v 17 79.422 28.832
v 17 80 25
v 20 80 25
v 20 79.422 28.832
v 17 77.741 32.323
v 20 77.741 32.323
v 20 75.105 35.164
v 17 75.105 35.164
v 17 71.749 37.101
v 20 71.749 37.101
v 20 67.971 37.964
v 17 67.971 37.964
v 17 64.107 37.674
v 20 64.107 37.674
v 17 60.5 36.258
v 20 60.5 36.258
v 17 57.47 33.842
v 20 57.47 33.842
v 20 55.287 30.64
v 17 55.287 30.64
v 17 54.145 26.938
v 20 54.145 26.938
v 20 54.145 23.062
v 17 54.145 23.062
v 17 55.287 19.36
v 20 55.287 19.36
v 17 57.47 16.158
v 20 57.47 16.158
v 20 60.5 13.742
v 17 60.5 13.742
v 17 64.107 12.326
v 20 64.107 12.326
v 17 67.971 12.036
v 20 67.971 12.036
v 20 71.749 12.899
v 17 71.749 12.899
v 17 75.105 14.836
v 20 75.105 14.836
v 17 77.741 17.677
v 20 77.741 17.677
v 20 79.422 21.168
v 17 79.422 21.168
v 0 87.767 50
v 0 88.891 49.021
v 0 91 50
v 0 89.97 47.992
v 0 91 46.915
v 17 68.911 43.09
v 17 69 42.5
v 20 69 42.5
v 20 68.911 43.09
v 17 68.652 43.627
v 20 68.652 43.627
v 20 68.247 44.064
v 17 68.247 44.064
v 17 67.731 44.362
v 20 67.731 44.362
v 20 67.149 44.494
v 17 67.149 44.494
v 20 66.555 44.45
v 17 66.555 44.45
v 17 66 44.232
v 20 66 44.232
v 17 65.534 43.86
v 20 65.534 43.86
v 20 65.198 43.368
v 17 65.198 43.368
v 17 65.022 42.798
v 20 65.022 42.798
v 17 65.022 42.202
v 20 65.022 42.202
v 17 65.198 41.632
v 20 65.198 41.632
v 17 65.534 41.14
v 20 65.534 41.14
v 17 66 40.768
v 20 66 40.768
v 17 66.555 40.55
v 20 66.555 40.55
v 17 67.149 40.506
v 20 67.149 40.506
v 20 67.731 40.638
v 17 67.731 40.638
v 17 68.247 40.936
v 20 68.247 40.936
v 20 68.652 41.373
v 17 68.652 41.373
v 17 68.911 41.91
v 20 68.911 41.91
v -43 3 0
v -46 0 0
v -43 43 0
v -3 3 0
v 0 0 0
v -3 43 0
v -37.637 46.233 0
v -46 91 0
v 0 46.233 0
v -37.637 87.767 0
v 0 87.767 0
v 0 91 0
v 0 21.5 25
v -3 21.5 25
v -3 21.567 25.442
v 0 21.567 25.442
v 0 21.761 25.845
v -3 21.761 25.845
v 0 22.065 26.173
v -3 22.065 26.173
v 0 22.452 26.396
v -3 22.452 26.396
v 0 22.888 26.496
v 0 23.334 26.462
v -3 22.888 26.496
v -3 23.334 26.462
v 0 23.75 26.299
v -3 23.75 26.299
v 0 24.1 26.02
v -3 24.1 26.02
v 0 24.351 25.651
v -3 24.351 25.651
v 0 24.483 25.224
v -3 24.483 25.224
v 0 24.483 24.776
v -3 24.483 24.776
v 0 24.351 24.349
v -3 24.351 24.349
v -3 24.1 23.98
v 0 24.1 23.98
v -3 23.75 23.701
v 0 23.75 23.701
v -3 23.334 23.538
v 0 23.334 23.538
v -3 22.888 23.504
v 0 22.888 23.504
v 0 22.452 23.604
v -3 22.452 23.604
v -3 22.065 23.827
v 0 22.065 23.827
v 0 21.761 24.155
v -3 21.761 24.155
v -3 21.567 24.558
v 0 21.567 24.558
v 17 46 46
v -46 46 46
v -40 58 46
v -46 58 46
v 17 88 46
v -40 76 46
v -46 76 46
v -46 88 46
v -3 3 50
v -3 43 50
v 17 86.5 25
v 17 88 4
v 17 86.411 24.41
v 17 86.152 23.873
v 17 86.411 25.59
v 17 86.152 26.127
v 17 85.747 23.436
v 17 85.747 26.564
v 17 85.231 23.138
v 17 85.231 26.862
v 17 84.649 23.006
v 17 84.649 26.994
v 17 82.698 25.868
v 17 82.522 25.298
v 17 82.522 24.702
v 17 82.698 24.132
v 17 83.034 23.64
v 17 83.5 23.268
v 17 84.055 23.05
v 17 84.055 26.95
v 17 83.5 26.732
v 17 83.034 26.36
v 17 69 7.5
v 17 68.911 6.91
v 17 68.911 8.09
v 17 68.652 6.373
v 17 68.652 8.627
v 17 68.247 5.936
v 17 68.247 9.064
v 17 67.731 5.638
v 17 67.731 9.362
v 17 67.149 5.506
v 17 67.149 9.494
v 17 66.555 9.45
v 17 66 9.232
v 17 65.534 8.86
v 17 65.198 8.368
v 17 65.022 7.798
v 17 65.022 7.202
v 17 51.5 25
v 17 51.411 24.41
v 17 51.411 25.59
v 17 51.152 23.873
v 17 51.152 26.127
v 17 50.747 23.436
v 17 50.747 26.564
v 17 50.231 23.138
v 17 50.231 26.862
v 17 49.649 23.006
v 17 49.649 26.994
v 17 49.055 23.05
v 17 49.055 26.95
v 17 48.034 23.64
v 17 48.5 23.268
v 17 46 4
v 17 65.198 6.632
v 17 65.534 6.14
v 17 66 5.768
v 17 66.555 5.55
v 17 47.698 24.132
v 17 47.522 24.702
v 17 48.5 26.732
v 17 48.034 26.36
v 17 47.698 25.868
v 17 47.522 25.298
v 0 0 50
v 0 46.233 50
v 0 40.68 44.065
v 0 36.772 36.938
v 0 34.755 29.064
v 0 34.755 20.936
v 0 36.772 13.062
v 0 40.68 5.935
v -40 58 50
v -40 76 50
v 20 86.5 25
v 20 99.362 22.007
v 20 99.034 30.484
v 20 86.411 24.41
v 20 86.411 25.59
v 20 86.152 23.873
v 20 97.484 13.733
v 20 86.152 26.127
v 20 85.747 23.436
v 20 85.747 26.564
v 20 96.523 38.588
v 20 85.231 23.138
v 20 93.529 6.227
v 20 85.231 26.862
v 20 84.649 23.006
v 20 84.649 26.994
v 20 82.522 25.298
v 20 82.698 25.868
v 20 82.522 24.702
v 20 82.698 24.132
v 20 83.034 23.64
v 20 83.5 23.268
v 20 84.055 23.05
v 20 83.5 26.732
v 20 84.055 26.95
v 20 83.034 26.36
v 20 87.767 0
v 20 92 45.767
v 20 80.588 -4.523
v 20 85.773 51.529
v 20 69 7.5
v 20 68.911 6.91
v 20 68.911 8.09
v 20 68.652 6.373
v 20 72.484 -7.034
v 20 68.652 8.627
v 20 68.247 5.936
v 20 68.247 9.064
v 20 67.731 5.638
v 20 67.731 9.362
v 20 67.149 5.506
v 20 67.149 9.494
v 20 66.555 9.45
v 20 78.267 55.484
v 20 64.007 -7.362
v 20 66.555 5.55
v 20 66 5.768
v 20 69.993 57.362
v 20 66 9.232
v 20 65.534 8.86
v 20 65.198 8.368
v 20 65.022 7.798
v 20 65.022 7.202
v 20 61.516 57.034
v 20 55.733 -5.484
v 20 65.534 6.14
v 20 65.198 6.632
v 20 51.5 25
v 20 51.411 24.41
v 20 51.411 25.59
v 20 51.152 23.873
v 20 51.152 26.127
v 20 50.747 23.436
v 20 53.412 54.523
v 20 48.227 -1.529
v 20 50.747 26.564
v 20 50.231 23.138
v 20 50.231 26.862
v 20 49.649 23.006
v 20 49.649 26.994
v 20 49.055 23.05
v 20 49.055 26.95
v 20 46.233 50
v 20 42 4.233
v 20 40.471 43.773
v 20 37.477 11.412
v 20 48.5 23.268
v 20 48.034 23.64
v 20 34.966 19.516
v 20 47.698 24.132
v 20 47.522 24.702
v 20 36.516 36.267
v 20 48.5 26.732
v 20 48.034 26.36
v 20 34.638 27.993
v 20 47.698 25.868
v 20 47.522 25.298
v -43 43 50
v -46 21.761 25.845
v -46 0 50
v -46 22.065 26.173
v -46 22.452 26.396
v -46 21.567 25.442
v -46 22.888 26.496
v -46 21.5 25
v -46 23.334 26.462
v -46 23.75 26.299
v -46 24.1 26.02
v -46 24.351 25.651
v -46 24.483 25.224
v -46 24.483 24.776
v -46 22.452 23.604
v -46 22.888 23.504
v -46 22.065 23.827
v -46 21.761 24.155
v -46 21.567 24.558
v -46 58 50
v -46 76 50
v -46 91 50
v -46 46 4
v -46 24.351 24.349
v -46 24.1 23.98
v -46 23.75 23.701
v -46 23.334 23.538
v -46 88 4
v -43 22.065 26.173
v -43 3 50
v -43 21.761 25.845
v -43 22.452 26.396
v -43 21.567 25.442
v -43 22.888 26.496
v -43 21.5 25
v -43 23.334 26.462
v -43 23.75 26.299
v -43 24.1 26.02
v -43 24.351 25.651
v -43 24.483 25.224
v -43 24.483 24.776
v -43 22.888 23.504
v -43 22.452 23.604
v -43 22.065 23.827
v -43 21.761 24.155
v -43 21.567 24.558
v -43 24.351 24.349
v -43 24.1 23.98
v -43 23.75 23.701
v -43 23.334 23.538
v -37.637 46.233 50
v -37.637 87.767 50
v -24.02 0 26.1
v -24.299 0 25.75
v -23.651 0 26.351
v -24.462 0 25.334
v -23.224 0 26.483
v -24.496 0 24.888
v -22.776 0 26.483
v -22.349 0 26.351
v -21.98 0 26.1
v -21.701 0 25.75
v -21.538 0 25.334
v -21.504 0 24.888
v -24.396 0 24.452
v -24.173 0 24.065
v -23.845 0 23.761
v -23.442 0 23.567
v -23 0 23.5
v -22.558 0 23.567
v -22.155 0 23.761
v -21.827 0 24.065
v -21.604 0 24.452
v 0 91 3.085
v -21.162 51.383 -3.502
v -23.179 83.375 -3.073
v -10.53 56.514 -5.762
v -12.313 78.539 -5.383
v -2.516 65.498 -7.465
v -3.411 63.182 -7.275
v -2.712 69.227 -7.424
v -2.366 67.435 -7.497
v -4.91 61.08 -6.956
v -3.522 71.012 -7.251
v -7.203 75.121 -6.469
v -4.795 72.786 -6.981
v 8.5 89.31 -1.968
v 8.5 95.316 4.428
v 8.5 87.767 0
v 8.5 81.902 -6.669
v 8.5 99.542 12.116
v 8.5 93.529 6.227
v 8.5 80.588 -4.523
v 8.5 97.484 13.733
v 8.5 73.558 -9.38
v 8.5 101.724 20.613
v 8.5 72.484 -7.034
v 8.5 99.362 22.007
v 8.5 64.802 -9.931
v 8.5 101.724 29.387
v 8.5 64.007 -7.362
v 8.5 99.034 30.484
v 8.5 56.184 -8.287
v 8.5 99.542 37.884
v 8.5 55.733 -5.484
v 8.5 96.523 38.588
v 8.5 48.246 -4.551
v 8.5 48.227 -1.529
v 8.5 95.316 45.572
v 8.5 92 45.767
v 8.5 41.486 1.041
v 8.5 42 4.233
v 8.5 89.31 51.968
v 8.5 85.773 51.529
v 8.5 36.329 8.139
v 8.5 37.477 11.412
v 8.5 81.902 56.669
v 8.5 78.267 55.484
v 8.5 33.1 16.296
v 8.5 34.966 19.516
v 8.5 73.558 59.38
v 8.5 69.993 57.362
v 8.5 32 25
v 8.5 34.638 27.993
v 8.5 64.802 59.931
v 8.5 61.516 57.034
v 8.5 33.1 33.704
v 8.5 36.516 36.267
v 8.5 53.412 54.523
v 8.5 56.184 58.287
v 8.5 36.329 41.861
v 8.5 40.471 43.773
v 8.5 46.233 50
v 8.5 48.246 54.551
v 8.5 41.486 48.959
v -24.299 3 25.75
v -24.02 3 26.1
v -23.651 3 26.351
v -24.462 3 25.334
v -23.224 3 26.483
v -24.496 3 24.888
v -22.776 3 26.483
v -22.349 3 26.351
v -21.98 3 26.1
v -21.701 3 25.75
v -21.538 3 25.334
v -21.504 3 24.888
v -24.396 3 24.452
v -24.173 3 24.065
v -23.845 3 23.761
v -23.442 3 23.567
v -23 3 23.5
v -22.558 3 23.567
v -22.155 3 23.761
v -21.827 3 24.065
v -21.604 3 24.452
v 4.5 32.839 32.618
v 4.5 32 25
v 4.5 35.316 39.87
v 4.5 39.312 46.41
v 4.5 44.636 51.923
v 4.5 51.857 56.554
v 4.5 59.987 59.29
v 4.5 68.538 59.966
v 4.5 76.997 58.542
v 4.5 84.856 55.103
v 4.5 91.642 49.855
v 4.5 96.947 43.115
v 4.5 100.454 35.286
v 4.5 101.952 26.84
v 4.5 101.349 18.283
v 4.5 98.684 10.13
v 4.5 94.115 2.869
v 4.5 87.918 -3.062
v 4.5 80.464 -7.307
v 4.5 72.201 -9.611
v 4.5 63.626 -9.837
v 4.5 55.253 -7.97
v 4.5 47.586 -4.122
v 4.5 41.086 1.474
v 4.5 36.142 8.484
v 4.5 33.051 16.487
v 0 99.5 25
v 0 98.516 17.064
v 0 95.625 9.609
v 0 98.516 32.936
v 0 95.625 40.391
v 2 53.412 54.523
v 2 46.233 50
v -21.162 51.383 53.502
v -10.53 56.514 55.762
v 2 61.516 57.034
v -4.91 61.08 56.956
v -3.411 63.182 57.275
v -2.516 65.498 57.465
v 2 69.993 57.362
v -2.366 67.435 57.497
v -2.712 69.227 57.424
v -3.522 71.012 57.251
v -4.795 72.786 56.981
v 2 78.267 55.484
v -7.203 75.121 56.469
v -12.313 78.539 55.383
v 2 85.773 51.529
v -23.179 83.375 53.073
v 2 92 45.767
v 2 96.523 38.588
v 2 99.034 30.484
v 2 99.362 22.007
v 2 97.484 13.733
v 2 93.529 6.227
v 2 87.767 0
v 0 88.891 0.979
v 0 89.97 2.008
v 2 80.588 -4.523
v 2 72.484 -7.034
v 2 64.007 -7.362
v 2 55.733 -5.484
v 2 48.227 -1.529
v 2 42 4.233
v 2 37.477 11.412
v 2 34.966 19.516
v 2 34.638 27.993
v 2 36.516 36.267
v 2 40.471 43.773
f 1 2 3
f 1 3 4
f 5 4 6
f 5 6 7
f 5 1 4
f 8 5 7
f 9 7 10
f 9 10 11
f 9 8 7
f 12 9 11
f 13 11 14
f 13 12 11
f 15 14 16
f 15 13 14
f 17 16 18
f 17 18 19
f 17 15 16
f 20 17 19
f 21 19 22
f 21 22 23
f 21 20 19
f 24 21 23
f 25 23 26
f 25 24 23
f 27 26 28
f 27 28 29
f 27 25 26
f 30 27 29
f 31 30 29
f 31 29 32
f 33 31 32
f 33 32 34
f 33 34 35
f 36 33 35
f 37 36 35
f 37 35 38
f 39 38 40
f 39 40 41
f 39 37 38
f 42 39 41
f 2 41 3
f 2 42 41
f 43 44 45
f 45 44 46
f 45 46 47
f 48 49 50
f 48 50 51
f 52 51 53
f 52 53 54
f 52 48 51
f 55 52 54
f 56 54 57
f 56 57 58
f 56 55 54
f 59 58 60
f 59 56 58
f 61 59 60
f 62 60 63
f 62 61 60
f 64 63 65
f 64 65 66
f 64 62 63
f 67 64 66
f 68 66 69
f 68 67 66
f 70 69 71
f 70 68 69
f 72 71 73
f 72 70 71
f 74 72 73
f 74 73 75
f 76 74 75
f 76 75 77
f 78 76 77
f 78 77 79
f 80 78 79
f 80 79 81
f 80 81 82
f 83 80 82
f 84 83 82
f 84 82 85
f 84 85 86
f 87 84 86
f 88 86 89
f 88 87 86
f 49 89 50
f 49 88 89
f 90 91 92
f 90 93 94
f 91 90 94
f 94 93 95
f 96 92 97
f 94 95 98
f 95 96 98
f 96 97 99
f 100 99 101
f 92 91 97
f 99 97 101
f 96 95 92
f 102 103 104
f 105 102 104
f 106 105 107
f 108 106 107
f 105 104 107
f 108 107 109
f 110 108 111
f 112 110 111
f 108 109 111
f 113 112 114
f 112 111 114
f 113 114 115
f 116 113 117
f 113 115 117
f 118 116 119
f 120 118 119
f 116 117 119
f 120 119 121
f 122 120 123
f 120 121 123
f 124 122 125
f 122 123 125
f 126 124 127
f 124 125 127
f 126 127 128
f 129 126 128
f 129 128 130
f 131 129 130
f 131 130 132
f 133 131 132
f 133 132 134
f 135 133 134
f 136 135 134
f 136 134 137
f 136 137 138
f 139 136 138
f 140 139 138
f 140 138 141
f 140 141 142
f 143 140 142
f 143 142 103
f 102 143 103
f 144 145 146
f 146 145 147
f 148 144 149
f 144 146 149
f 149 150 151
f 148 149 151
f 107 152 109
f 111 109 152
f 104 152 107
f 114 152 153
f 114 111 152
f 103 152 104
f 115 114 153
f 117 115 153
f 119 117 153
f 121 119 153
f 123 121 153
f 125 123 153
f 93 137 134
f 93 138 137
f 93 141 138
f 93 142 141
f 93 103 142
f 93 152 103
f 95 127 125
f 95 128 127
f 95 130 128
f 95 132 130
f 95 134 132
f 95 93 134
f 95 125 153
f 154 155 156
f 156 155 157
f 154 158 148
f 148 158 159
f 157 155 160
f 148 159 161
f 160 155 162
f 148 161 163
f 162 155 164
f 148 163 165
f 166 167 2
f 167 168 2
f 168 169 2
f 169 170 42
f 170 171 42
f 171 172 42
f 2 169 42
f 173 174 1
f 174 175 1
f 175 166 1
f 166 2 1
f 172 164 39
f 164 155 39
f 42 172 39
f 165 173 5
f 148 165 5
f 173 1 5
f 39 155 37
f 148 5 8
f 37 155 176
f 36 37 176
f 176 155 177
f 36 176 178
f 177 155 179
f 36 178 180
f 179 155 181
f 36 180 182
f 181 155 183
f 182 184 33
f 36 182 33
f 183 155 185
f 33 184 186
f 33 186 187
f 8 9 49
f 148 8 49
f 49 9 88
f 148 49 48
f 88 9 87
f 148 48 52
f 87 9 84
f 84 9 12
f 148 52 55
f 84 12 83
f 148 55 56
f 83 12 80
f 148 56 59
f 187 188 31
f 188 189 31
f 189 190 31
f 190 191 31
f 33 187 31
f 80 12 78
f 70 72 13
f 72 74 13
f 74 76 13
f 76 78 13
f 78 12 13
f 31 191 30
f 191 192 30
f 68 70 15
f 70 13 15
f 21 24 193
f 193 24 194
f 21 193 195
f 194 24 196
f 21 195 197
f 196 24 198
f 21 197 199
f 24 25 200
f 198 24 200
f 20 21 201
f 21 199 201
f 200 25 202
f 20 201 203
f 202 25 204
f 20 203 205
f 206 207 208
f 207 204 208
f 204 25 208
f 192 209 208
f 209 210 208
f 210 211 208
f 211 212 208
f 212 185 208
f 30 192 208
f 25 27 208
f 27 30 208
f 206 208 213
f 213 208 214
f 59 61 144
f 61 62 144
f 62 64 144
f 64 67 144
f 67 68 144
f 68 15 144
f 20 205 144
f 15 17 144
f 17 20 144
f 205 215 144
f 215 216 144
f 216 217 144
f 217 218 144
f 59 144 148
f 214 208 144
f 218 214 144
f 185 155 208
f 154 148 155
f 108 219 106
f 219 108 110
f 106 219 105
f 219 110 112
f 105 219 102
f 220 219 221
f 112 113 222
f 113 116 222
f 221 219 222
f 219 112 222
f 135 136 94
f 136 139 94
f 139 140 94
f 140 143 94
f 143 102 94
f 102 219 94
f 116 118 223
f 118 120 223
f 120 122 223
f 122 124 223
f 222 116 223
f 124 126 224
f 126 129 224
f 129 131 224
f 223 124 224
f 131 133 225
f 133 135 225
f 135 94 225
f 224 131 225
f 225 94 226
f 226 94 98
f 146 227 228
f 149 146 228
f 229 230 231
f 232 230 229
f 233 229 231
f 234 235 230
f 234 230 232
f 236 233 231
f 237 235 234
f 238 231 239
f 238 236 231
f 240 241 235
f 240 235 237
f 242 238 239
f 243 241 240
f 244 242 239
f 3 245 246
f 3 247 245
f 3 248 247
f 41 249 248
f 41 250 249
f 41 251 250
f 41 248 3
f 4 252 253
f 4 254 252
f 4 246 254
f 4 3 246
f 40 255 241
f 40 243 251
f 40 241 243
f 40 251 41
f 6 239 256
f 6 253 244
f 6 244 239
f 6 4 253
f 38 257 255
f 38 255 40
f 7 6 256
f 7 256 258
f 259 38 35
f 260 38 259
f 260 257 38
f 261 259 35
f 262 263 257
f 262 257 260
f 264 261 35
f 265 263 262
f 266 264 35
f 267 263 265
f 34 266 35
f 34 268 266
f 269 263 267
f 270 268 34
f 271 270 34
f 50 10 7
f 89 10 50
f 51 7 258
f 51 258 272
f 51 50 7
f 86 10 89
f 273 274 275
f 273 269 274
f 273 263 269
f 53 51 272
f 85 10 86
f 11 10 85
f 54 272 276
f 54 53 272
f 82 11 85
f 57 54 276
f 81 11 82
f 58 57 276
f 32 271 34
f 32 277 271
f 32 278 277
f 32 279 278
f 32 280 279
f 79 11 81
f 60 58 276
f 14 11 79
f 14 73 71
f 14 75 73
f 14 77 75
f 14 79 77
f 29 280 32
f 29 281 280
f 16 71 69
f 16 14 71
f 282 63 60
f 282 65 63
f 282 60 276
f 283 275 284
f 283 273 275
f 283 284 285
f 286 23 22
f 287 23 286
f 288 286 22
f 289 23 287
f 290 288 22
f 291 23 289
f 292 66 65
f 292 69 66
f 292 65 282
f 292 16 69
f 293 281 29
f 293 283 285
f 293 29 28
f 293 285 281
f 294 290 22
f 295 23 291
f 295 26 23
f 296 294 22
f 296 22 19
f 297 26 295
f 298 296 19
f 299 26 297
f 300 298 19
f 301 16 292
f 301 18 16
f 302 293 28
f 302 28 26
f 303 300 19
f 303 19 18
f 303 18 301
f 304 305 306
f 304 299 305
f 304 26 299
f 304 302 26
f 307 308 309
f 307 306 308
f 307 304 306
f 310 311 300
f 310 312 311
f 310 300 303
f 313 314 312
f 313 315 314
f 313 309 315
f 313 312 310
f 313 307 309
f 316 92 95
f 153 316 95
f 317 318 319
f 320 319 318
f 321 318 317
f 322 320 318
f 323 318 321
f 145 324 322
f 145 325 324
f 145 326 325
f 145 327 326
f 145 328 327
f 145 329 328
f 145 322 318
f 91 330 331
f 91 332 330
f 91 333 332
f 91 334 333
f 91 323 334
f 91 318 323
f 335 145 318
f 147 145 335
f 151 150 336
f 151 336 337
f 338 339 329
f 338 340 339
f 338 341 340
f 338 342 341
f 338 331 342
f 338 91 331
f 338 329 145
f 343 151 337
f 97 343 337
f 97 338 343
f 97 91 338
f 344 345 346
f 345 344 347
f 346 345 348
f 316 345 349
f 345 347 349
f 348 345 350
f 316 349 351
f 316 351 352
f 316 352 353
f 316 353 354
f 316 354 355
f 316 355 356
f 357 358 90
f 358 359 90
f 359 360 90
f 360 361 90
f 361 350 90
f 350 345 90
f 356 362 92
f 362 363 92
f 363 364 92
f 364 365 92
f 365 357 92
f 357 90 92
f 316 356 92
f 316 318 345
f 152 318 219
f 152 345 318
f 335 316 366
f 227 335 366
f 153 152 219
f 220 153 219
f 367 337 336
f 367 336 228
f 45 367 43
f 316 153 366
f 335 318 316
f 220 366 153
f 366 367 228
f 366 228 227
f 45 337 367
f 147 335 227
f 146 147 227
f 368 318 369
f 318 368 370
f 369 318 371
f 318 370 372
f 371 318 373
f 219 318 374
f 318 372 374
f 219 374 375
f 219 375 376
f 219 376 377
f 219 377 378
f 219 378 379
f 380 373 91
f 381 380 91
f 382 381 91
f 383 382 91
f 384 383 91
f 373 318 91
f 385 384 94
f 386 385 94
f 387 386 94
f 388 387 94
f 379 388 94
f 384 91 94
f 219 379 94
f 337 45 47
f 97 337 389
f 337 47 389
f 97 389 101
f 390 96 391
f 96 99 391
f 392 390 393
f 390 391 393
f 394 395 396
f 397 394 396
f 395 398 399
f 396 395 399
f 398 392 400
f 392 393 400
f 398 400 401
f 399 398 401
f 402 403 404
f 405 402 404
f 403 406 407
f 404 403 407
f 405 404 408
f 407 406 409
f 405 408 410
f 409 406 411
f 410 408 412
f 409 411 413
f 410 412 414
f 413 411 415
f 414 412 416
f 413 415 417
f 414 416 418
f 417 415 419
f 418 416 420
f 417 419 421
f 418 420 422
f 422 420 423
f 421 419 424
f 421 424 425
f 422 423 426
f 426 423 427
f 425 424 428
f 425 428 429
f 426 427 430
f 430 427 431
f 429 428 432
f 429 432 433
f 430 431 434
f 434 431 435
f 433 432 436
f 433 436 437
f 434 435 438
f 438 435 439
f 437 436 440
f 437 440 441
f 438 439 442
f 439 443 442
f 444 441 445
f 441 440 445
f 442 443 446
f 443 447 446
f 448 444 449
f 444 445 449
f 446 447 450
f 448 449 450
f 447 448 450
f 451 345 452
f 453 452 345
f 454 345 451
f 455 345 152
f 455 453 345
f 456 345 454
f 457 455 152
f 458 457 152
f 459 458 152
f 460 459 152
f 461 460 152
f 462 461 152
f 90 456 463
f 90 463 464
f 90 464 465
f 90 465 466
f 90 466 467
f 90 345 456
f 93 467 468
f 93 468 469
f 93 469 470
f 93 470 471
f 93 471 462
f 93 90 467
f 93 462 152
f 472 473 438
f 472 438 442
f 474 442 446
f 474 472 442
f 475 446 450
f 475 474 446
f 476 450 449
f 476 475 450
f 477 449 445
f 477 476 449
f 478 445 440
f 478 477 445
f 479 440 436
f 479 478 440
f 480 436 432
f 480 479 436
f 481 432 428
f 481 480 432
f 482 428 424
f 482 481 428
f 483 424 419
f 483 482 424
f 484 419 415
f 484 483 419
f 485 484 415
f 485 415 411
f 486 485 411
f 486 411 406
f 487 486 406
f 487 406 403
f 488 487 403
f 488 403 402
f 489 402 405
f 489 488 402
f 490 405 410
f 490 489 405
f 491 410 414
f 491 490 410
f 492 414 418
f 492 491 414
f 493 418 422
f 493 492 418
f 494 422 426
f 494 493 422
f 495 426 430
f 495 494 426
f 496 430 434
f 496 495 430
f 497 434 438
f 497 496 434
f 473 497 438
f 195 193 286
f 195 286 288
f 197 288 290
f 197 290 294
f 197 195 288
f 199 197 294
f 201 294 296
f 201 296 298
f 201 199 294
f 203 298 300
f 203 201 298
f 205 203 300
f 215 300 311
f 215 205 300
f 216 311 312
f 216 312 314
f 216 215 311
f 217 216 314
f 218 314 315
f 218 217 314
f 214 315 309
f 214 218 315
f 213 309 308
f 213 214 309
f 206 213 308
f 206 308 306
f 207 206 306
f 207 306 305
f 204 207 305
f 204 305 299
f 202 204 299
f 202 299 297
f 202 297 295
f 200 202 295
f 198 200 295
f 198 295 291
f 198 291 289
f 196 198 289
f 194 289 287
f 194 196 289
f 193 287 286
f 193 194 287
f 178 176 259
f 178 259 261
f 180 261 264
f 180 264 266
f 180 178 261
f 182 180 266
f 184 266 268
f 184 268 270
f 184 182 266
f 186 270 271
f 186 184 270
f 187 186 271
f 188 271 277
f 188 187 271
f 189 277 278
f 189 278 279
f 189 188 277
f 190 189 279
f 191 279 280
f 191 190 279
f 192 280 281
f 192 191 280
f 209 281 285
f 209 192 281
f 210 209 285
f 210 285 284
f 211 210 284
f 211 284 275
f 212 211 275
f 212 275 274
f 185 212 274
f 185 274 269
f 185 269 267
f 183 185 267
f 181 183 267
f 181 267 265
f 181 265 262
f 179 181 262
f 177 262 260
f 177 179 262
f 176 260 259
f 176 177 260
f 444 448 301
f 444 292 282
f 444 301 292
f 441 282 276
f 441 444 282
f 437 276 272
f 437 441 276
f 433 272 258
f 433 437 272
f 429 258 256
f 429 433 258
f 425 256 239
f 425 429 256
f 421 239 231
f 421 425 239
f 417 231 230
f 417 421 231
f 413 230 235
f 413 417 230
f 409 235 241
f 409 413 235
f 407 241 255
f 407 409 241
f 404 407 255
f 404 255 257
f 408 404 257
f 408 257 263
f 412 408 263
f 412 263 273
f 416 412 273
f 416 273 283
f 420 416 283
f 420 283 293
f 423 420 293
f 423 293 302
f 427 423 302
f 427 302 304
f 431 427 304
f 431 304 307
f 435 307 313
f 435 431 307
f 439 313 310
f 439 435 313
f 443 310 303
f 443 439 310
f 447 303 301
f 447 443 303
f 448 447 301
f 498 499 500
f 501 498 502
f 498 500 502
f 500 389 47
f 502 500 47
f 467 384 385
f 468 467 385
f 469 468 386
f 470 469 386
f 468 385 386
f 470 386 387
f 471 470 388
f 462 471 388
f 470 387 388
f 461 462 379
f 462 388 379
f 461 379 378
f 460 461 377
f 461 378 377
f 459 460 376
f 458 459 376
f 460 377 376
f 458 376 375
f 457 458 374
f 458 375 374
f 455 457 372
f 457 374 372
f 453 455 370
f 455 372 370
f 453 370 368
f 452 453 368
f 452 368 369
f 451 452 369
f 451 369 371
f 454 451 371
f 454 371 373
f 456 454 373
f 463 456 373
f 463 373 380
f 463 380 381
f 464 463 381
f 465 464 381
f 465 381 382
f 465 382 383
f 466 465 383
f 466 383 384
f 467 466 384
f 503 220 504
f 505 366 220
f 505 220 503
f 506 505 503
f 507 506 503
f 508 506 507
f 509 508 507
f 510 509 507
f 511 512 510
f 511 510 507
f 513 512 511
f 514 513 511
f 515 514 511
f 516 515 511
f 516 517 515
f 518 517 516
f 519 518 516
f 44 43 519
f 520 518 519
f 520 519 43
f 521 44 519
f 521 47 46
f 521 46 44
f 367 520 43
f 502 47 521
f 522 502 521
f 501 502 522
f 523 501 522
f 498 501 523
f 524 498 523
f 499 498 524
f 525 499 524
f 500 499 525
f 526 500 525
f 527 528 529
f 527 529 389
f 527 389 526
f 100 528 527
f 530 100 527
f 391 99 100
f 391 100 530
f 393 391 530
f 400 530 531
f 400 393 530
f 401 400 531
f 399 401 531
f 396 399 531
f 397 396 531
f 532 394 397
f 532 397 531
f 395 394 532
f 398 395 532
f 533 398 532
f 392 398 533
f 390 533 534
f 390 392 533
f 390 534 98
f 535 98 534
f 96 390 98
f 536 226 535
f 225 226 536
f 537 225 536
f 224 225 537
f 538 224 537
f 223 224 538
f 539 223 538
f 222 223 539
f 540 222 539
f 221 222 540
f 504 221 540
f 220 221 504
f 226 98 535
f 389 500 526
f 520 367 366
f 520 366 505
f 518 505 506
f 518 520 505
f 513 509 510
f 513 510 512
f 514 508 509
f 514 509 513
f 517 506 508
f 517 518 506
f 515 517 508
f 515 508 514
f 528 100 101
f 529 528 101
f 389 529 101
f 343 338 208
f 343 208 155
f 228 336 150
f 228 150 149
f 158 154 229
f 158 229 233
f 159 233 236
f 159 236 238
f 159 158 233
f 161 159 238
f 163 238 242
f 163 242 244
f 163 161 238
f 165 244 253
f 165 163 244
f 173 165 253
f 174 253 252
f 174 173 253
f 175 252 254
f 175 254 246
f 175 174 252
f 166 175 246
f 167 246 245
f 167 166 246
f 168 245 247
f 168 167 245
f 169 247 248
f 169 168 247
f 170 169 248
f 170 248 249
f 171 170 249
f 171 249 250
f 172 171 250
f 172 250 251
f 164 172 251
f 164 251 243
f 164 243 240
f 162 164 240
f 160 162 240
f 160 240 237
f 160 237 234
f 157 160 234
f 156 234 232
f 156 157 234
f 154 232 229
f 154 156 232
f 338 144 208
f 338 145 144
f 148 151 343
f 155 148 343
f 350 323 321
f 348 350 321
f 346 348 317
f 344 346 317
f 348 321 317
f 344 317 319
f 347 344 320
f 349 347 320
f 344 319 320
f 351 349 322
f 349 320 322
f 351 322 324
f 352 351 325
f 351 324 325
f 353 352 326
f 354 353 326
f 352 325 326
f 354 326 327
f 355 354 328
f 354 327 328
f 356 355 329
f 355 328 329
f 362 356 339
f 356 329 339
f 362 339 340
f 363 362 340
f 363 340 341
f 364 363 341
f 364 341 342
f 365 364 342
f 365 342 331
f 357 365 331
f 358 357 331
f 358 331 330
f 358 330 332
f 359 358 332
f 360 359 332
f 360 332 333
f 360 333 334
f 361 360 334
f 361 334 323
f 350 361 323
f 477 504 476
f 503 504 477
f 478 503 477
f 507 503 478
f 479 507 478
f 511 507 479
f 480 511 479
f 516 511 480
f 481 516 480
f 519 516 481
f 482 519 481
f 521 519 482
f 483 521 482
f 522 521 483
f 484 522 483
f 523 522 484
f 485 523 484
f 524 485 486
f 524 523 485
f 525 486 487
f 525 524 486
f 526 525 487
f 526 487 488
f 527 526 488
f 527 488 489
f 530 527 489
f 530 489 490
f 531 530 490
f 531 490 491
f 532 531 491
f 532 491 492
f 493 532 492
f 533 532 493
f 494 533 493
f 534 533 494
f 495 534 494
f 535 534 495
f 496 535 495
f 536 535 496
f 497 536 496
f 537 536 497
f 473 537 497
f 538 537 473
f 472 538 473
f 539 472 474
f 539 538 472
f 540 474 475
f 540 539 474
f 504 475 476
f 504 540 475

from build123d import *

# Parameters (mm, degrees)
ESQUISSE1_W             = 46
ESQUISSE1_H             = 46
ESQUISSE1_W_2           = 40
ESQUISSE1_H_2           = 40
BOSS_EXTRU_1_DEPTH      = 50
ESQUISSE2_W             = 50
ESQUISSE2_H             = 48
ESQUISSE2_W_2           = 42
ESQUISSE2_H_2           = 42
BOSS_EXTRU_2_DEPTH      = 46
ESQUISSE4_W             = 6
ESQUISSE4_H             = 18
ENL_V_MAT_EXTRU_1_DEPTH = 6
ESQUISSE5_R             = 32.5
ESQUISSE5_W             = 42
ESQUISSE5_H             = 42
BOSS_EXTRU_3_DEPTH      = 17
ESQUISSE6_R             = 32.5
ESQUISSE6_R_2           = 2
ESQUISSE6_R_3           = 13
BOSS_EXTRU_4_DEPTH      = 3
CHANFREIN1_SIZE         = 37.637040876
CHANFREIN1_SIZE_2       = 8
BOSS_EXTRU_5_START      = -5
ESQUISSE7_R             = 35
ESQUISSE7_R_2           = 32.5
BOSS_EXTRU_5_DEPTH      = 3.5
CHANFREIN2_SIZE         = 3
ESQUISSE8_R             = 1.5
ENL_V_MAT_EXTRU_2_DEPTH = 136.499077488
ESQUISSE9_R             = 1.5
ENL_V_MAT_EXTRU_3_DEPTH = 13.5


with BuildPart() as part:
    # Esquisse1 → Boss.-Extru.1 (new body)
    with BuildSketch(Plane.XY):
        with Locations((-23, 23)):
            Rectangle(ESQUISSE1_W, ESQUISSE1_H)
        with Locations((-23, 23)):
            Rectangle(ESQUISSE1_W_2, ESQUISSE1_H_2, mode=Mode.SUBTRACT)
    extrude(amount=BOSS_EXTRU_1_DEPTH)

    # Esquisse2 → Boss.-Extru.2 (add)
    with BuildSketch(Plane(origin=(0, 0, 0), x_dir=(0, 0, -1), z_dir=(1, 0, 0))):
        with Locations((-25, 67)):
            Rectangle(ESQUISSE2_W, ESQUISSE2_H)
        with Locations((-25, 67)):
            Rectangle(ESQUISSE2_W_2, ESQUISSE2_H_2, mode=Mode.SUBTRACT)
    extrude(amount=-BOSS_EXTRU_2_DEPTH)

    # Esquisse4 → Enlèv. mat.-Extru.1 (cut)
    with BuildSketch(Plane.XY.offset(50)):
        with Locations((-43, 67)):
            Rectangle(ESQUISSE4_W, ESQUISSE4_H)
    extrude(amount=-ENL_V_MAT_EXTRU_1_DEPTH, mode=Mode.SUBTRACT)

    # Esquisse5 → Boss.-Extru.3 (add)
    with BuildSketch(Plane(origin=(0, 0, 0), x_dir=(0, 0, -1), z_dir=(1, 0, 0))):
        with Locations(Location((-25, 67, 0), (0, 0, 219.715137232))):
            Circle(ESQUISSE5_R)
        with Locations((-25, 67)):
            Rectangle(ESQUISSE5_W, ESQUISSE5_H, mode=Mode.SUBTRACT)
    extrude(amount=BOSS_EXTRU_3_DEPTH)

    # Esquisse6 → Boss.-Extru.4 (add)
    with BuildSketch(Plane(origin=(17, 0, 0), x_dir=(0, 0, -1), z_dir=(1, 0, 0))):
        with Locations(Location((-25, 67, 0), (0, 0, 219.715137232))):
            Circle(ESQUISSE6_R)
        with Locations(Location((-25, 84.5, 0), (0, 0, 90))):
            Circle(ESQUISSE6_R_2, mode=Mode.SUBTRACT)
        with Locations(Location((-7.5, 67, 0), (0, 0, 90))):
            Circle(ESQUISSE6_R_2, mode=Mode.SUBTRACT)
        with Locations(Location((-25, 49.5, 0), (0, 0, 90))):
            Circle(ESQUISSE6_R_2, mode=Mode.SUBTRACT)
        with Locations(Location((-42.5, 67, 0), (0, 0, 90))):
            Circle(ESQUISSE6_R_2, mode=Mode.SUBTRACT)
        with Locations(Location((-25, 67, 0), (0, 0, 90))):
            Circle(ESQUISSE6_R_3, mode=Mode.SUBTRACT)
    extrude(amount=BOSS_EXTRU_4_DEPTH)

    # Chanfrein1
    # the kernel refuses this chamfer: 37.637040876, 8 mm, written as the material it adds along each edge
    with BuildSketch(Plane(origin=(0, 185.543751295, 50), x_dir=(-0.999967974892076, 0, -0.008003073799517018), z_dir=(0, -1, 0))) as chanfrein1_piece_1_section:
        Polygon((CHANFREIN1_SIZE * 0.999967974888, -CHANFREIN1_SIZE * 0.00800307379948), (-CHANFREIN1_SIZE_2 * 0.00800307379952, -CHANFREIN1_SIZE_2 * 0.999967974892), (0, 0), align=None)
    chanfrein1_piece_1 = extrude(amount=237.08750259, mode=Mode.PRIVATE)
    chanfrein1_piece_1 = chanfrein1_piece_1 & Plane(origin=(-15.292244733, 67, 25), x_dir=(0, -0.6389710663806465, 0.7692307692288313), z_dir=(-1, 0, 0)) * Cylinder(32.5, 625, mode=Mode.PRIVATE)
    add(chanfrein1_piece_1)
    with BuildSketch(Plane(origin=(0, 185.543751295, 0), x_dir=(-0.999967974892076, 0, 0.008003073799517044), z_dir=(0, -1, 0))) as chanfrein1_piece_2_section:
        Polygon((CHANFREIN1_SIZE * 0.999967974888, CHANFREIN1_SIZE * 0.00800307379948), (-CHANFREIN1_SIZE_2 * 0.00800307379952, CHANFREIN1_SIZE_2 * 0.999967974892), (0, 0), align=None)
    chanfrein1_piece_2 = extrude(amount=237.08750259, mode=Mode.PRIVATE)
    chanfrein1_piece_2 = chanfrein1_piece_2 & Plane(origin=(-15.292244734, 67, 25), x_dir=(0, -0.6389710663806465, 0.7692307692288313), z_dir=(-1, 0, 0)) * Cylinder(32.5, 625, mode=Mode.PRIVATE)
    add(chanfrein1_piece_2)

    # Esquisse7 → Boss.-Extru.5 (add)
    with BuildSketch(Plane.ZY.offset(BOSS_EXTRU_5_START)):
        with Locations(Location((25, 67, 0), (0, 0, 270))):
            Circle(ESQUISSE7_R)
        with Locations(Location((25, 67, 0), (0, 0, 270))):
            Circle(ESQUISSE7_R_2, mode=Mode.SUBTRACT)
    extrude(amount=-BOSS_EXTRU_5_DEPTH)

    # Chanfrein2
    # the kernel refuses this chamfer: 3 mm, written as the material it adds along each edge
    with BuildSketch(Plane(origin=(5, 67, 25), x_dir=(0, -0.6389710663806288, 0.7692307692288458), z_dir=(0, -0.7692307692288458, -0.6389710663806288))) as chanfrein2_piece_1_section:
        Polygon((32.5 + CHANFREIN2_SIZE, 0), (32.5, CHANFREIN2_SIZE), (32.5, 0), align=None)
    chanfrein2_piece_1 = revolve(axis=Axis((5, 67, 25), (-1, 0, 0)), mode=Mode.PRIVATE)
    chanfrein2_piece_1 = chanfrein2_piece_1 & Plane(origin=(3.278266852, 67, 25), x_dir=(0, -1, 0), z_dir=(-1, 0, 0)) * Cylinder(35, 142, mode=Mode.PRIVATE)
    add(chanfrein2_piece_1)

    # Esquisse8 → Enlèv. mat.-Extru.2 (cut, through all)
    with BuildSketch(Plane.ZY.offset(46)):
        with Locations(Location((25, 23, 0), (0, 0, 270))):
            Circle(ESQUISSE8_R)
    extrude(amount=-ENL_V_MAT_EXTRU_2_DEPTH, mode=Mode.SUBTRACT)

    # Esquisse9 → Enlèv. mat.-Extru.3 (cut)
    with BuildSketch(Plane.XZ):
        with Locations(Location((-23, 25, 0), (0, 0, 270))):
            Circle(ESQUISSE9_R)
    extrude(amount=-ENL_V_MAT_EXTRU_3_DEPTH, mode=Mode.SUBTRACT)


solid = part.part
